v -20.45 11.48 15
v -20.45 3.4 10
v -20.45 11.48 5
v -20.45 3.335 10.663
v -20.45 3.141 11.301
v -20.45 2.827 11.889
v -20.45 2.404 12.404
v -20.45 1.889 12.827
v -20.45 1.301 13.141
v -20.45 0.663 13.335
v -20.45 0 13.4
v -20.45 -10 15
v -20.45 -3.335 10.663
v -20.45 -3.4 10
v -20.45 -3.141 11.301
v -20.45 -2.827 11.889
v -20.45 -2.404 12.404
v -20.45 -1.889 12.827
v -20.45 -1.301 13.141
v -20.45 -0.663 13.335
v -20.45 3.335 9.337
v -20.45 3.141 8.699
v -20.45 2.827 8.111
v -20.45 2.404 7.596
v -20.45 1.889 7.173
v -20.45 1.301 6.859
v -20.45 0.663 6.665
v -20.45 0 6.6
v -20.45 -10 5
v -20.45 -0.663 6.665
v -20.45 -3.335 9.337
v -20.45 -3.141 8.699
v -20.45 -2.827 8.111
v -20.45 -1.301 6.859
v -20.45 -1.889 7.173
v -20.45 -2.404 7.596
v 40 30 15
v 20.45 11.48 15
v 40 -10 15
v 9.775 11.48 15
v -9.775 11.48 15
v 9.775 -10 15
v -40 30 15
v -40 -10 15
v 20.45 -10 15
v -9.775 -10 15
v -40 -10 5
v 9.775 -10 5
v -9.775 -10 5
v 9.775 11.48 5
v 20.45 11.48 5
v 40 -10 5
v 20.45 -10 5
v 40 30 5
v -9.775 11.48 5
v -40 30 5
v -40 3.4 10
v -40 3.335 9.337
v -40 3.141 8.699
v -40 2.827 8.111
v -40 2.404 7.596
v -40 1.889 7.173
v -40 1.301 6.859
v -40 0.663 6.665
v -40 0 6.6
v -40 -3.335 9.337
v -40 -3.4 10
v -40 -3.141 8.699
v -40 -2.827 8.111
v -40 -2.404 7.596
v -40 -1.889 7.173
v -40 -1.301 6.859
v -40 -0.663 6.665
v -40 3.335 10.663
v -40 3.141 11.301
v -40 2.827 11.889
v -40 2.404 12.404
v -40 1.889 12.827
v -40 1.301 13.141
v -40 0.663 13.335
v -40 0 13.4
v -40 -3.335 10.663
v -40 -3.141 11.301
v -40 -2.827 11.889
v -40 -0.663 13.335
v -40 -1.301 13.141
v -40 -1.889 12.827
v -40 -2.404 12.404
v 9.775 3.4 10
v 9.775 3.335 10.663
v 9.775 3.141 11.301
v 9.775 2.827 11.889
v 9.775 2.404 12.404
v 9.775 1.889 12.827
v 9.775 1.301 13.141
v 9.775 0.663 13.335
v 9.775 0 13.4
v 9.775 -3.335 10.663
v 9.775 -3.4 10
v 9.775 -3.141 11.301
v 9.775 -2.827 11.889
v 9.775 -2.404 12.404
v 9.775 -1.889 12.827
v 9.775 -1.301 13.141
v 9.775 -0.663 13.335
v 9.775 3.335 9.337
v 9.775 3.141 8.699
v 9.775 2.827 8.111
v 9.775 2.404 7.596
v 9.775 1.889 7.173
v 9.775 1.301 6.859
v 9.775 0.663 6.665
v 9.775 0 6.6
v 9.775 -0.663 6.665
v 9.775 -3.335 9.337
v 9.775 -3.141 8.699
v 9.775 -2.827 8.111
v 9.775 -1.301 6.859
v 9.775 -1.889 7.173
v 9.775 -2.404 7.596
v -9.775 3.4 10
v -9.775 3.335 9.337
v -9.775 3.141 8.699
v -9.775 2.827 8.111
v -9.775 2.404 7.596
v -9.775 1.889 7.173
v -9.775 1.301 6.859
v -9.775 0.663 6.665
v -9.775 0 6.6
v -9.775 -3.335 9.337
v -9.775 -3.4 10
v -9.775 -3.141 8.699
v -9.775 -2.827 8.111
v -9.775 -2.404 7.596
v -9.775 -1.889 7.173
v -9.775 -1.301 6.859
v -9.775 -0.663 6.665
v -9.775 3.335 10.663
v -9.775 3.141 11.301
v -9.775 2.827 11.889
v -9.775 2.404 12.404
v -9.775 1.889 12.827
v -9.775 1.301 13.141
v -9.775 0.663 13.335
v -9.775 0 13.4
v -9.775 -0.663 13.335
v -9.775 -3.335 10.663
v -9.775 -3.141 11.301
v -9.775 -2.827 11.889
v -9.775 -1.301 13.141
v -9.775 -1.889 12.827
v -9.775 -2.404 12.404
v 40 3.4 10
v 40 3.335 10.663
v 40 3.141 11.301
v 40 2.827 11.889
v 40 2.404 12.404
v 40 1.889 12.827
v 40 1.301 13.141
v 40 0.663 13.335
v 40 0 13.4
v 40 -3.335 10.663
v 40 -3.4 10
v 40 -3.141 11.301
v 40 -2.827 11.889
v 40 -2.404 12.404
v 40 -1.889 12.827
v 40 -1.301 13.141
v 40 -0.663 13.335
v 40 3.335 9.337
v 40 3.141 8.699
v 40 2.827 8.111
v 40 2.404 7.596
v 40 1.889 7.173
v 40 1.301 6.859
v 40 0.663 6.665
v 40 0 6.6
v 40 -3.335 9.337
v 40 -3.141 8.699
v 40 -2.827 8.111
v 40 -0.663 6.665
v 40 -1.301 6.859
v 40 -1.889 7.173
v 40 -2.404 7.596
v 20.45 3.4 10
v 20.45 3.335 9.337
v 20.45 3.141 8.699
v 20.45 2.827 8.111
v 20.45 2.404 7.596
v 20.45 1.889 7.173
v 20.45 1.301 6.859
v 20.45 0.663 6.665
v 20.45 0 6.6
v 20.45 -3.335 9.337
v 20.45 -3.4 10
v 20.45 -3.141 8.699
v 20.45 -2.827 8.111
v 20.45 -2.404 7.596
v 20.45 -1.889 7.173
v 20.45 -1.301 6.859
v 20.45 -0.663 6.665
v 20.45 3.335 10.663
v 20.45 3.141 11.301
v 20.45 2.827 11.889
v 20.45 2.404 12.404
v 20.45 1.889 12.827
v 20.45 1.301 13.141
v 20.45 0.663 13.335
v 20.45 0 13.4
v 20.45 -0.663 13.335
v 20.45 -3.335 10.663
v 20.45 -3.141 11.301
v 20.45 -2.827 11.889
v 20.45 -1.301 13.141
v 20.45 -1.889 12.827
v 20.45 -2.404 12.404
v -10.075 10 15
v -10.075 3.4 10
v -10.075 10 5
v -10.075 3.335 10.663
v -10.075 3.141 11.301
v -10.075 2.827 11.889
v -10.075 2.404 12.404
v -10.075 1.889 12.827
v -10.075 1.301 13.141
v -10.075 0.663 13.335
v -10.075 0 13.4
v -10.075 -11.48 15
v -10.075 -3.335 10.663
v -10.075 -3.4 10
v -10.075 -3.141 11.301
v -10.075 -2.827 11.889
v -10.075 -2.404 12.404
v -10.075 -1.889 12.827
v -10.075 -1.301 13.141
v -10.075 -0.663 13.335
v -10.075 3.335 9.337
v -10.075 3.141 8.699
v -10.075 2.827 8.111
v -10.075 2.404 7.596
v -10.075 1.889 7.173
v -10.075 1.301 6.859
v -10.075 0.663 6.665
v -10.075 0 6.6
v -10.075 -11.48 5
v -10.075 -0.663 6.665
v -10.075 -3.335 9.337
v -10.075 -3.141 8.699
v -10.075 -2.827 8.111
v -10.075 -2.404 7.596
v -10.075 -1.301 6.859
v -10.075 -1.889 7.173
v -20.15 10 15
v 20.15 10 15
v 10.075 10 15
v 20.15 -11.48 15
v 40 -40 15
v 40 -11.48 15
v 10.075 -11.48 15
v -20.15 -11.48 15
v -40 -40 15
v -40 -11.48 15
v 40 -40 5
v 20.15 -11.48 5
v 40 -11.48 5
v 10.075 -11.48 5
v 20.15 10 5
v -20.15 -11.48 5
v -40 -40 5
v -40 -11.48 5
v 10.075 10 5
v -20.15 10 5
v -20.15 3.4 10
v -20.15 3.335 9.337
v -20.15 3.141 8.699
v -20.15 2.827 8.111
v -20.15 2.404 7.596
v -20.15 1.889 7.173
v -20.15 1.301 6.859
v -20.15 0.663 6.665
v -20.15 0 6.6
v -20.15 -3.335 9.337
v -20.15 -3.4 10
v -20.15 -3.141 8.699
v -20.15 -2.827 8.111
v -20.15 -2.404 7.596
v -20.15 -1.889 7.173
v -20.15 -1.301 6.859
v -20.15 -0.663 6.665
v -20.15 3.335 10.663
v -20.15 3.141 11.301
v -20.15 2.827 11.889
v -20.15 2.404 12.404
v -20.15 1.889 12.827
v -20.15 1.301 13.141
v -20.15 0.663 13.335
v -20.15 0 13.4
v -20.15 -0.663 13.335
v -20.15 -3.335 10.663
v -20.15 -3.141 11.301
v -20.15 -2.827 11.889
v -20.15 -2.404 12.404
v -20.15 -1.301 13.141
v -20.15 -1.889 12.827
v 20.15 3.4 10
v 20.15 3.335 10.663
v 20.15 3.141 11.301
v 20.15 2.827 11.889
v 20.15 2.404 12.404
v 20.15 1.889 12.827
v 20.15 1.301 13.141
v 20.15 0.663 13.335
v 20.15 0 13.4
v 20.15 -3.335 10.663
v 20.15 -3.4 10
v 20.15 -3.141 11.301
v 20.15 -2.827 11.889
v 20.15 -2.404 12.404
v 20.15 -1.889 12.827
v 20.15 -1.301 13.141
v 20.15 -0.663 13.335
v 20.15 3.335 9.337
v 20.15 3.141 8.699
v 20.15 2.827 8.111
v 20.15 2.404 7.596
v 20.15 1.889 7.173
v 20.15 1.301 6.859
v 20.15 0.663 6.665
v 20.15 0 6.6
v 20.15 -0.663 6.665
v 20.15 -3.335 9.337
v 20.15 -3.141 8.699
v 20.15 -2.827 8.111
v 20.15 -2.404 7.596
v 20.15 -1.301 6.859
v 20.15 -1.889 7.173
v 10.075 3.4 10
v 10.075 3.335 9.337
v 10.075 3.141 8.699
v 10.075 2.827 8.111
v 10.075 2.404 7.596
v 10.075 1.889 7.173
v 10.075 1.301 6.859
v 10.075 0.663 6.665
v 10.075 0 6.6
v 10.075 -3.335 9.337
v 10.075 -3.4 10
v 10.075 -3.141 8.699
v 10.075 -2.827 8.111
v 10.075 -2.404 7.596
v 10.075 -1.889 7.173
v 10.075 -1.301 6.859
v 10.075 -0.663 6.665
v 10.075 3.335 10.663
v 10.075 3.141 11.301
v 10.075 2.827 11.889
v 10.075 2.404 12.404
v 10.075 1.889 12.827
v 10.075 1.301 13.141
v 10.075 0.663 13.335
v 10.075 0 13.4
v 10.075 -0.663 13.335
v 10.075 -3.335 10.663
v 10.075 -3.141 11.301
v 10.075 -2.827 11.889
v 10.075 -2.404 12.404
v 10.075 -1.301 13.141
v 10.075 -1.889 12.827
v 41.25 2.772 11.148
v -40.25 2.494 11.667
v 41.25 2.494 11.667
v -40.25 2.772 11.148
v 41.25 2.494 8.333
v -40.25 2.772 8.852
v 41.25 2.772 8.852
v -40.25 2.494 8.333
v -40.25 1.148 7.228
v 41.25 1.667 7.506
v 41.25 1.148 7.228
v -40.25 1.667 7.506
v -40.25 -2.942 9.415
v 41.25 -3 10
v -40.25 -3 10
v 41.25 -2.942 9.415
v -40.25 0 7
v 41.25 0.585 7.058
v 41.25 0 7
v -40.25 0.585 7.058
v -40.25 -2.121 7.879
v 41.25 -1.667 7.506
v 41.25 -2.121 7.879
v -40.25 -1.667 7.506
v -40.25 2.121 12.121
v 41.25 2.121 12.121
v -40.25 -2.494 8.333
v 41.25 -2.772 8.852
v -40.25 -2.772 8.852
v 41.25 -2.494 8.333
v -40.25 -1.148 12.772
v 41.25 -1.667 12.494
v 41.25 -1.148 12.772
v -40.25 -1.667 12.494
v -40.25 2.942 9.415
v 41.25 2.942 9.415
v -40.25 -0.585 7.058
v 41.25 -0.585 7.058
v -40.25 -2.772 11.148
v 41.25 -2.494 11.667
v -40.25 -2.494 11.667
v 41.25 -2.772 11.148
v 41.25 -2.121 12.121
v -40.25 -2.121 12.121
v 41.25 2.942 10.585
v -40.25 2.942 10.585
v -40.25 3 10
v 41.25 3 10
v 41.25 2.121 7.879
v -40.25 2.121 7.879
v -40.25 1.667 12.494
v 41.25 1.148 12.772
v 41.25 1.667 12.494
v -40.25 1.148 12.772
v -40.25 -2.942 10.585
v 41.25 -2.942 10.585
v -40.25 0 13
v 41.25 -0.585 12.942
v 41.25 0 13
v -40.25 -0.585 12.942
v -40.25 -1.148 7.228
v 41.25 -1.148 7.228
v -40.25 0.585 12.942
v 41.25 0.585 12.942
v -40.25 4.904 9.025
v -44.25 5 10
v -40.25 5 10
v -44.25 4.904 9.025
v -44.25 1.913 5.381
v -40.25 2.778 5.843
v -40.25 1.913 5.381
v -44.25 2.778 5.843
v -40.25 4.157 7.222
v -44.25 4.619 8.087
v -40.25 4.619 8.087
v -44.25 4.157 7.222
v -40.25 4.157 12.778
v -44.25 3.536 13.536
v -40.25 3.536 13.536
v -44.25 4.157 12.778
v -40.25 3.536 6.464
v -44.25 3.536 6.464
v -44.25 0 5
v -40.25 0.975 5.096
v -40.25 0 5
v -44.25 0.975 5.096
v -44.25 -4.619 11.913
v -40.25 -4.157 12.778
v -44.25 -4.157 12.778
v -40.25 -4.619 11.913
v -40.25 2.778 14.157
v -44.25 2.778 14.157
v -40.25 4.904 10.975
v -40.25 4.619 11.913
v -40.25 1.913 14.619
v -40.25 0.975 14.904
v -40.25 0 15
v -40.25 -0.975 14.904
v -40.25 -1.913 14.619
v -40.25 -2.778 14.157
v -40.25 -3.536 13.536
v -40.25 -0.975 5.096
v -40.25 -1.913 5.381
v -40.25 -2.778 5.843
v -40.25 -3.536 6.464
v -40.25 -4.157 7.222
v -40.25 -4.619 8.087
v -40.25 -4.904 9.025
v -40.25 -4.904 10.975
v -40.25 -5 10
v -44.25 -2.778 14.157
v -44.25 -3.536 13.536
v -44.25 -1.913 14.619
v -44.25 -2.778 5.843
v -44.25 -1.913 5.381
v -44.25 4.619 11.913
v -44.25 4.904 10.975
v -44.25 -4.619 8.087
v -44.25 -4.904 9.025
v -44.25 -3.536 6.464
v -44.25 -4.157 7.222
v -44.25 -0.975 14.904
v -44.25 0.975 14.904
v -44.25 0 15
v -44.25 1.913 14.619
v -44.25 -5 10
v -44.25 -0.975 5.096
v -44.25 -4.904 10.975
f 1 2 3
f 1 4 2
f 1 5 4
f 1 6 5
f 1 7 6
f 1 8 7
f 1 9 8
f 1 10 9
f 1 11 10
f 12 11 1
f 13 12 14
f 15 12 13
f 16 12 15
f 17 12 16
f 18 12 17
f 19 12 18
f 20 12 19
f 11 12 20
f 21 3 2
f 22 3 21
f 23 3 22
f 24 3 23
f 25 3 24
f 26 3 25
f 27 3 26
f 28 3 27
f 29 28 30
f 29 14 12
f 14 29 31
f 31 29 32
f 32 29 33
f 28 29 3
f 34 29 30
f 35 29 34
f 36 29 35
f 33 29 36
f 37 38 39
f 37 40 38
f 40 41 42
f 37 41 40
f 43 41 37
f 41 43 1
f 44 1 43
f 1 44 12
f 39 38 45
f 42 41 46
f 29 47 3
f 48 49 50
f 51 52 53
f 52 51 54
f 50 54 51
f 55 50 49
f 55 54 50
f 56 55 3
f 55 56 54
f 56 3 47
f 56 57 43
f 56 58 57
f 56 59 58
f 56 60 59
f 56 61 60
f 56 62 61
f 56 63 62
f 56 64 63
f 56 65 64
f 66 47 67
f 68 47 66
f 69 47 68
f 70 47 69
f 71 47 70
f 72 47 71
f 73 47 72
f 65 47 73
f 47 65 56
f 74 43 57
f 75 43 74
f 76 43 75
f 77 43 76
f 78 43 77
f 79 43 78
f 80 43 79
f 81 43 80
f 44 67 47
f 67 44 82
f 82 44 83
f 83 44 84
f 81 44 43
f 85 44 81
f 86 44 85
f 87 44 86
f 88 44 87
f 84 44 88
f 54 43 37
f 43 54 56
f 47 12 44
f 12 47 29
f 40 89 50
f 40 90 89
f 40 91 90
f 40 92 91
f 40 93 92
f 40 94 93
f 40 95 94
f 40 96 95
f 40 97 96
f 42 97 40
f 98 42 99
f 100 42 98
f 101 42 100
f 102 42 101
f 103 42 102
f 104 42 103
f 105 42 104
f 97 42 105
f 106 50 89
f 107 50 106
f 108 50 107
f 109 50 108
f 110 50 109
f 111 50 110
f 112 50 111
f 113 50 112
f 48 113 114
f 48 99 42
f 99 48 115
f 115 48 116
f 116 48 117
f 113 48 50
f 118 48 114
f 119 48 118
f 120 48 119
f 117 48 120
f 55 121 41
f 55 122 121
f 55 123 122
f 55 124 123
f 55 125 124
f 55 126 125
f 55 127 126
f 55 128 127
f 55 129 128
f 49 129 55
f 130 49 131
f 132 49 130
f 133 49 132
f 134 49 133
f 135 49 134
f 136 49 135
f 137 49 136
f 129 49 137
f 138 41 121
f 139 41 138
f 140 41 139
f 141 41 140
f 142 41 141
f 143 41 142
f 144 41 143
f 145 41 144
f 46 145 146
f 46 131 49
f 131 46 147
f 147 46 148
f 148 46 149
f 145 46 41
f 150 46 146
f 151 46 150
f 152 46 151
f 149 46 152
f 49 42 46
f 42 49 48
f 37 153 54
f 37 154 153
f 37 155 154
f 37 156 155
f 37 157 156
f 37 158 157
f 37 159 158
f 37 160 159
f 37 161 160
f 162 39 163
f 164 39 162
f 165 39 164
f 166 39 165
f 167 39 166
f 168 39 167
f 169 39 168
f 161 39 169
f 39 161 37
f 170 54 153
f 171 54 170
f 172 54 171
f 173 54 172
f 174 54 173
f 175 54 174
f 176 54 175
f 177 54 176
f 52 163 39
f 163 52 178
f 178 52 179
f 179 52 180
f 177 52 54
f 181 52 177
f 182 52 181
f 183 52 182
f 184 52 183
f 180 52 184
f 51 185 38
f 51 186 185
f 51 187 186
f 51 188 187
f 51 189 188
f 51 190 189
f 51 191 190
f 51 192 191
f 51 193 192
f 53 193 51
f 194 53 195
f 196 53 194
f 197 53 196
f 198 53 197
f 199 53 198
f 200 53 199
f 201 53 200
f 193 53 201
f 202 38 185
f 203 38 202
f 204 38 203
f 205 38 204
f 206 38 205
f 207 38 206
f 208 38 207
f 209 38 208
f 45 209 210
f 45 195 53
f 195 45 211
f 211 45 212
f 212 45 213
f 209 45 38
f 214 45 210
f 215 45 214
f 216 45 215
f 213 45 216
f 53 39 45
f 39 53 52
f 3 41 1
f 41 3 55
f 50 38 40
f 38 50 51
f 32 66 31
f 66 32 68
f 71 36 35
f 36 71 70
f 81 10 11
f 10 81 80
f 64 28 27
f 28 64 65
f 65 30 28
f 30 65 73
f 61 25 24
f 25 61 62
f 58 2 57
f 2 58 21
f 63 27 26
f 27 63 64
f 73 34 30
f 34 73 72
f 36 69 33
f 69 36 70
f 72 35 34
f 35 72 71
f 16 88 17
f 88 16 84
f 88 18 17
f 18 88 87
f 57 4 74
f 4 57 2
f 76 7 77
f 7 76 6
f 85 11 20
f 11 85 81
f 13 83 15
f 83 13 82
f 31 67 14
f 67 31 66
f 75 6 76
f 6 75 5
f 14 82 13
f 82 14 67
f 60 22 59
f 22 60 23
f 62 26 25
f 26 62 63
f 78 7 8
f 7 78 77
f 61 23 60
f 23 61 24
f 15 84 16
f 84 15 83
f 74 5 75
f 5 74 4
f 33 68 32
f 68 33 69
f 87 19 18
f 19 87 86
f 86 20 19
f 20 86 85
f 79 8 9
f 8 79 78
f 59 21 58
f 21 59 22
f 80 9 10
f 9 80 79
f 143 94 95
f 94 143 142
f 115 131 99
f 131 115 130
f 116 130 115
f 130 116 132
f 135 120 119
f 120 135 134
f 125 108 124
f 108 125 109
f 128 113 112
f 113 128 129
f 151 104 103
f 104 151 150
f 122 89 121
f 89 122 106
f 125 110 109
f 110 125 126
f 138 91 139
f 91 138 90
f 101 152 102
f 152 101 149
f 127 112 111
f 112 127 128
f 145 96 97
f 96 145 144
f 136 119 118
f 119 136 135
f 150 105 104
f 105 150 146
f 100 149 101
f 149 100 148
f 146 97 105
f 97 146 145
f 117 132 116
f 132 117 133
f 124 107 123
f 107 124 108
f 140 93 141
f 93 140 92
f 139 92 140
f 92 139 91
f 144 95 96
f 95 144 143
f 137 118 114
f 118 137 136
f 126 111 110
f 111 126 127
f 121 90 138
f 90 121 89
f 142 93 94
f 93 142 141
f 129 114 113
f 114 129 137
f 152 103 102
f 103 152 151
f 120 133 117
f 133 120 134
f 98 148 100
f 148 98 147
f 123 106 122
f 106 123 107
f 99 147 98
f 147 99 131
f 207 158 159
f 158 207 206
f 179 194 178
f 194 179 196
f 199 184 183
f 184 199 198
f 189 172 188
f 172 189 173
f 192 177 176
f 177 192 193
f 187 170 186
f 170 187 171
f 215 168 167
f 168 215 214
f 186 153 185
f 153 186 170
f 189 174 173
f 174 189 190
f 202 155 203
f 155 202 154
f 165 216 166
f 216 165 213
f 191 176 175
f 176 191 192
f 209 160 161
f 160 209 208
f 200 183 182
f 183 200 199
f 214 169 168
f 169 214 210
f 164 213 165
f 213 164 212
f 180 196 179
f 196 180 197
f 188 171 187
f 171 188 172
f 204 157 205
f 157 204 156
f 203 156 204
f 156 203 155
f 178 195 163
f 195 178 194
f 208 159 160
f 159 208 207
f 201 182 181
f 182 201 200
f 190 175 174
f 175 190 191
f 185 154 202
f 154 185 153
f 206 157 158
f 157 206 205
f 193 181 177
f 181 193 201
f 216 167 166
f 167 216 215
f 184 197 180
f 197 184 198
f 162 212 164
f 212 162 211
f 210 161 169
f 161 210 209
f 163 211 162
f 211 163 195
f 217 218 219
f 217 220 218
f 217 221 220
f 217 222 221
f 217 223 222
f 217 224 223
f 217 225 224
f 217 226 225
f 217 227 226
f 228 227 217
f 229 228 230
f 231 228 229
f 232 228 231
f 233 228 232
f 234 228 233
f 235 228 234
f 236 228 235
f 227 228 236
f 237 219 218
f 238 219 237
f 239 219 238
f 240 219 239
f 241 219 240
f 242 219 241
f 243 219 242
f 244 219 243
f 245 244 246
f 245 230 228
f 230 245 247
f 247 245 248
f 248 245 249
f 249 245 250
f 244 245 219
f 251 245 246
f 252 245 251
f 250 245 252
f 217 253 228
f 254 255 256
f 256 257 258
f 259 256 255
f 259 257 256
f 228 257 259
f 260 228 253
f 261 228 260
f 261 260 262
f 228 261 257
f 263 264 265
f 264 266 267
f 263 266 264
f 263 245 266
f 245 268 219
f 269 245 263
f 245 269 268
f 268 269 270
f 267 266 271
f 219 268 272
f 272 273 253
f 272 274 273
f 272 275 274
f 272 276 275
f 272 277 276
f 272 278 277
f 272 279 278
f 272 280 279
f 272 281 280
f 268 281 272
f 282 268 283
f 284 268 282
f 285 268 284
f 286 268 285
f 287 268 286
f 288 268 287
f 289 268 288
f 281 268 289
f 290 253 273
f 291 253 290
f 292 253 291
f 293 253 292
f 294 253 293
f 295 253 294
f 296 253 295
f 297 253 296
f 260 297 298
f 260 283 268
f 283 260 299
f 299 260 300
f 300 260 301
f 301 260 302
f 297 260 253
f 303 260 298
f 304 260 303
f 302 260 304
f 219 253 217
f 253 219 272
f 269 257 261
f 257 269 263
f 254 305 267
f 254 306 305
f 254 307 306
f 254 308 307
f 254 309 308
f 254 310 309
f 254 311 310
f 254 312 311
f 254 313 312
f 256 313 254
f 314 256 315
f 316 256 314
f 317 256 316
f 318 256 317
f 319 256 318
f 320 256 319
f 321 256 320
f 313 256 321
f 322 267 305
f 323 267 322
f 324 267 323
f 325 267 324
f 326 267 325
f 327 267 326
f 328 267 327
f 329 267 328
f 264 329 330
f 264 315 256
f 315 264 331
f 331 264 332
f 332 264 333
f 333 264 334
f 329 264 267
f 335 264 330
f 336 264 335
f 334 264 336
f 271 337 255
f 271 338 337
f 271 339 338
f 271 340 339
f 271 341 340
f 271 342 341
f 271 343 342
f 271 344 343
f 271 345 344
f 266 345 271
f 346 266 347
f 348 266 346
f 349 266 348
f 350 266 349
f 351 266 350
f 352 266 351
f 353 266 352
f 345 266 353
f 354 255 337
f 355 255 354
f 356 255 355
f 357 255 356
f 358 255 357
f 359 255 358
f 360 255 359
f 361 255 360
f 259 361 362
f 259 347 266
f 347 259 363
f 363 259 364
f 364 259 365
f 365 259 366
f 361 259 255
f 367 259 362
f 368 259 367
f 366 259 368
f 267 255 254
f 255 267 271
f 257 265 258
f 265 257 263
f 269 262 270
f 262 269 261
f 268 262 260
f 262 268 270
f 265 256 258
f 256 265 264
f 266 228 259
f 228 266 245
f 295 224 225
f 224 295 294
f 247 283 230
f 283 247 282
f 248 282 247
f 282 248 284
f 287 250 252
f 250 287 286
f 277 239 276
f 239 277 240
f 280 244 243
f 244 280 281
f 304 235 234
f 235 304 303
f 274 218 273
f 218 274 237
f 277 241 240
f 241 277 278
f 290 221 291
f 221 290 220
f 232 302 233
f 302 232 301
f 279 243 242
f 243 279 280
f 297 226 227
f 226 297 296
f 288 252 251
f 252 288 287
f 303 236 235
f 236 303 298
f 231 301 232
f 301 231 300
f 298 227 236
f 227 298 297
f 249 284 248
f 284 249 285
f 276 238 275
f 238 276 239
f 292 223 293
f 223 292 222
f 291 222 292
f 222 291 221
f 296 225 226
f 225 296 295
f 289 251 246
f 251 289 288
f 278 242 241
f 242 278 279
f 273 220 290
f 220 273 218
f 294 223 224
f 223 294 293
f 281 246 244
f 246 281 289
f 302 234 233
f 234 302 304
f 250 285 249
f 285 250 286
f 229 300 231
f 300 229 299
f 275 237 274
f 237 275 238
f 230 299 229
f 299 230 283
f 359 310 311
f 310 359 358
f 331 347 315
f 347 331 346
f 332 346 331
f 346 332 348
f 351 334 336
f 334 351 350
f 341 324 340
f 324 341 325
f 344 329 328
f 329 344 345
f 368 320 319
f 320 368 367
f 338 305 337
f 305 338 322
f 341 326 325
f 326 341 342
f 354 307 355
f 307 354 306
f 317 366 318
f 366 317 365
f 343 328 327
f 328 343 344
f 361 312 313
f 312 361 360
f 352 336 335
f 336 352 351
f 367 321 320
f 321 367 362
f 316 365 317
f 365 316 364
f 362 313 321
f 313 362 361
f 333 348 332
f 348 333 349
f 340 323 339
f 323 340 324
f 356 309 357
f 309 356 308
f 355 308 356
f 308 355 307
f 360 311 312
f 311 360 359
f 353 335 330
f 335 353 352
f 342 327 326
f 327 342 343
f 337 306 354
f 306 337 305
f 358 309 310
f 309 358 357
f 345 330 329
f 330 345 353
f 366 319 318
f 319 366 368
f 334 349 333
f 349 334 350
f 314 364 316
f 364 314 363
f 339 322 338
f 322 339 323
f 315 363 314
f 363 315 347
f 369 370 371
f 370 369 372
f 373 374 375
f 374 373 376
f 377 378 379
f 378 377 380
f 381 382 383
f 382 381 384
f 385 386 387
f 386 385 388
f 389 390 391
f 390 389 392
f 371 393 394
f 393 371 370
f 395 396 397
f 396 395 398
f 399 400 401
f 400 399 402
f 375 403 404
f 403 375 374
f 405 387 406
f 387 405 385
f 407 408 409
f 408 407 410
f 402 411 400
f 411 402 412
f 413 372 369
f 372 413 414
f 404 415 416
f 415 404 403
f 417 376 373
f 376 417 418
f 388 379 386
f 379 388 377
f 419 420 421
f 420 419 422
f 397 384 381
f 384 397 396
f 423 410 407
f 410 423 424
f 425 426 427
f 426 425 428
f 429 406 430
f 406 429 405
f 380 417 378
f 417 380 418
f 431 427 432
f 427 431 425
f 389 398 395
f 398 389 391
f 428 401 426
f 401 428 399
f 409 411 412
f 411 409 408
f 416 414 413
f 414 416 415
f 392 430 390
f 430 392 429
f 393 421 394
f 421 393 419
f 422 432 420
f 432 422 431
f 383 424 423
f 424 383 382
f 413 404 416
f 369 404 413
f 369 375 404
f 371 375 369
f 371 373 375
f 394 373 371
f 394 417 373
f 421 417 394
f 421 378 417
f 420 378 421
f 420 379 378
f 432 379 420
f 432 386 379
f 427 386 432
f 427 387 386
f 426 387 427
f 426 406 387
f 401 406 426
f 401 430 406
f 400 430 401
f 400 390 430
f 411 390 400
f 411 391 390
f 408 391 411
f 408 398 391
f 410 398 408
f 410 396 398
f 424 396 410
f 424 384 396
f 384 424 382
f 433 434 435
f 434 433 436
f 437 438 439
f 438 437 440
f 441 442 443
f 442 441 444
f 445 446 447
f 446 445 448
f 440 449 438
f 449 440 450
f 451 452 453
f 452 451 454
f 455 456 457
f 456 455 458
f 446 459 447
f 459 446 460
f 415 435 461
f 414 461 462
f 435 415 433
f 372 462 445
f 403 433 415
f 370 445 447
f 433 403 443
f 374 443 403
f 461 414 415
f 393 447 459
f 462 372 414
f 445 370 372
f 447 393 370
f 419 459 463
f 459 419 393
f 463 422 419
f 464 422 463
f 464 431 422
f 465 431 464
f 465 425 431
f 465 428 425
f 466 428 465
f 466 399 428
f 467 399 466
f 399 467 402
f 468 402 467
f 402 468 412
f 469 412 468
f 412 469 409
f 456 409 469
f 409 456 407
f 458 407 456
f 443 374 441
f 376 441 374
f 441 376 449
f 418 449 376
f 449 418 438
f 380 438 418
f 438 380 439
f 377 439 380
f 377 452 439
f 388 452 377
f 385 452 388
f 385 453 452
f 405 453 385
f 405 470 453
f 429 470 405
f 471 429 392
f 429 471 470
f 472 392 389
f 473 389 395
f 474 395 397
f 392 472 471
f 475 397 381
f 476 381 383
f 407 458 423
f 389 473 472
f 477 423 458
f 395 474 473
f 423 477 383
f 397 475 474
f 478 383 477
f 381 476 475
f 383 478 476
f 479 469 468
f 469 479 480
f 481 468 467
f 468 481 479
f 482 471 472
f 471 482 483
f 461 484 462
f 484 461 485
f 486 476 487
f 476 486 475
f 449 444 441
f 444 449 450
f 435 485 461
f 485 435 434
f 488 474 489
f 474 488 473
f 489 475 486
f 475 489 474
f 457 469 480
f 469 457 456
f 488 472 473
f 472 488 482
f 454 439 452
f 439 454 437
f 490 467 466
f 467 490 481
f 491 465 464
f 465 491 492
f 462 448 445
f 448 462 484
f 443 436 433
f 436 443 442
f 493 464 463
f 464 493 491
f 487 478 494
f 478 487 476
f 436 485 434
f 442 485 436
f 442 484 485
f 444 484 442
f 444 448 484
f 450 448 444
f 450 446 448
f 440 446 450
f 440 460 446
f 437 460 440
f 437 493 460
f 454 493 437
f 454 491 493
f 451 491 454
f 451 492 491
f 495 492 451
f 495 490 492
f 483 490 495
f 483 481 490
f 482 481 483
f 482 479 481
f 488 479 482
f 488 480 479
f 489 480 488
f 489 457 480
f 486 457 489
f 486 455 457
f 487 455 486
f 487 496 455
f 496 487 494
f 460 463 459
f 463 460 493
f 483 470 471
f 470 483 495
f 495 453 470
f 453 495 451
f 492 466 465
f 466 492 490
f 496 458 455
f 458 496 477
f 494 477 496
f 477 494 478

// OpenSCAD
$fn = 32;

// ------------------------------------------------------------------------
// Butt hinge: hinge 80 mm, leaf swung 0 deg
// Every part is its own module, assembly() places every instance.
// ------------------------------------------------------------------------

// --- part 1 ---
module hinge_base() {
  difference() {
    union() {
      translate([-40, -10, -5]) cube([19.55, 40, 10]);
      translate([-9.775, -10, -5]) cube([19.55, 40, 10]);
      translate([20.45, -10, -5]) cube([19.55, 40, 10]);
      translate([-40, 11.48, -5]) cube([80, 18.52, 10]);
    }
    translate([-30.225, 0, 0]) rotate([0, 90, 0]) cylinder(h = 21.55, d = 6.8, center = true);
    translate([0, 0, 0]) rotate([0, 90, 0]) cylinder(h = 21.55, d = 6.8, center = true);
    translate([30.225, 0, 0]) rotate([0, 90, 0]) cylinder(h = 21.55, d = 6.8, center = true);
  }
}

// --- part 2 ---
module hinge_mover() {
  difference() {
    union() {
      translate([-20.15, -40, -5]) cube([10.075, 50, 10]);
      translate([10.075, -40, -5]) cube([10.075, 50, 10]);
      translate([-40, -40, -5]) cube([80, 28.52, 10]);
    }
    translate([-15.113, 0, 0]) rotate([0, 90, 0]) cylinder(h = 12.075, d = 6.8, center = true);
    translate([15.113, 0, 0]) rotate([0, 90, 0]) cylinder(h = 12.075, d = 6.8, center = true);
  }
}

// --- part 3 ---
module hinge_pin() {
  rotate([0, 90, 0]) cylinder(h = 82.5, d = 6, center = true);
  translate([-44.25, 0, 0]) rotate([0, 90, 0]) cylinder(h = 4, d = 10);
}

// --- assembly ---
module assembly() {
  color([0.80, 0.24, 0.20]) translate([0, 0, 10]) rotate([0, 0, 0]) hinge_base();
  color([0.20, 0.45, 0.75]) translate([0, 0, 10]) rotate([0, 0, 0]) hinge_mover();
  color([0.25, 0.62, 0.32]) translate([0, 0, 10]) rotate([0, 0, 0]) hinge_pin();
}

assembly();
